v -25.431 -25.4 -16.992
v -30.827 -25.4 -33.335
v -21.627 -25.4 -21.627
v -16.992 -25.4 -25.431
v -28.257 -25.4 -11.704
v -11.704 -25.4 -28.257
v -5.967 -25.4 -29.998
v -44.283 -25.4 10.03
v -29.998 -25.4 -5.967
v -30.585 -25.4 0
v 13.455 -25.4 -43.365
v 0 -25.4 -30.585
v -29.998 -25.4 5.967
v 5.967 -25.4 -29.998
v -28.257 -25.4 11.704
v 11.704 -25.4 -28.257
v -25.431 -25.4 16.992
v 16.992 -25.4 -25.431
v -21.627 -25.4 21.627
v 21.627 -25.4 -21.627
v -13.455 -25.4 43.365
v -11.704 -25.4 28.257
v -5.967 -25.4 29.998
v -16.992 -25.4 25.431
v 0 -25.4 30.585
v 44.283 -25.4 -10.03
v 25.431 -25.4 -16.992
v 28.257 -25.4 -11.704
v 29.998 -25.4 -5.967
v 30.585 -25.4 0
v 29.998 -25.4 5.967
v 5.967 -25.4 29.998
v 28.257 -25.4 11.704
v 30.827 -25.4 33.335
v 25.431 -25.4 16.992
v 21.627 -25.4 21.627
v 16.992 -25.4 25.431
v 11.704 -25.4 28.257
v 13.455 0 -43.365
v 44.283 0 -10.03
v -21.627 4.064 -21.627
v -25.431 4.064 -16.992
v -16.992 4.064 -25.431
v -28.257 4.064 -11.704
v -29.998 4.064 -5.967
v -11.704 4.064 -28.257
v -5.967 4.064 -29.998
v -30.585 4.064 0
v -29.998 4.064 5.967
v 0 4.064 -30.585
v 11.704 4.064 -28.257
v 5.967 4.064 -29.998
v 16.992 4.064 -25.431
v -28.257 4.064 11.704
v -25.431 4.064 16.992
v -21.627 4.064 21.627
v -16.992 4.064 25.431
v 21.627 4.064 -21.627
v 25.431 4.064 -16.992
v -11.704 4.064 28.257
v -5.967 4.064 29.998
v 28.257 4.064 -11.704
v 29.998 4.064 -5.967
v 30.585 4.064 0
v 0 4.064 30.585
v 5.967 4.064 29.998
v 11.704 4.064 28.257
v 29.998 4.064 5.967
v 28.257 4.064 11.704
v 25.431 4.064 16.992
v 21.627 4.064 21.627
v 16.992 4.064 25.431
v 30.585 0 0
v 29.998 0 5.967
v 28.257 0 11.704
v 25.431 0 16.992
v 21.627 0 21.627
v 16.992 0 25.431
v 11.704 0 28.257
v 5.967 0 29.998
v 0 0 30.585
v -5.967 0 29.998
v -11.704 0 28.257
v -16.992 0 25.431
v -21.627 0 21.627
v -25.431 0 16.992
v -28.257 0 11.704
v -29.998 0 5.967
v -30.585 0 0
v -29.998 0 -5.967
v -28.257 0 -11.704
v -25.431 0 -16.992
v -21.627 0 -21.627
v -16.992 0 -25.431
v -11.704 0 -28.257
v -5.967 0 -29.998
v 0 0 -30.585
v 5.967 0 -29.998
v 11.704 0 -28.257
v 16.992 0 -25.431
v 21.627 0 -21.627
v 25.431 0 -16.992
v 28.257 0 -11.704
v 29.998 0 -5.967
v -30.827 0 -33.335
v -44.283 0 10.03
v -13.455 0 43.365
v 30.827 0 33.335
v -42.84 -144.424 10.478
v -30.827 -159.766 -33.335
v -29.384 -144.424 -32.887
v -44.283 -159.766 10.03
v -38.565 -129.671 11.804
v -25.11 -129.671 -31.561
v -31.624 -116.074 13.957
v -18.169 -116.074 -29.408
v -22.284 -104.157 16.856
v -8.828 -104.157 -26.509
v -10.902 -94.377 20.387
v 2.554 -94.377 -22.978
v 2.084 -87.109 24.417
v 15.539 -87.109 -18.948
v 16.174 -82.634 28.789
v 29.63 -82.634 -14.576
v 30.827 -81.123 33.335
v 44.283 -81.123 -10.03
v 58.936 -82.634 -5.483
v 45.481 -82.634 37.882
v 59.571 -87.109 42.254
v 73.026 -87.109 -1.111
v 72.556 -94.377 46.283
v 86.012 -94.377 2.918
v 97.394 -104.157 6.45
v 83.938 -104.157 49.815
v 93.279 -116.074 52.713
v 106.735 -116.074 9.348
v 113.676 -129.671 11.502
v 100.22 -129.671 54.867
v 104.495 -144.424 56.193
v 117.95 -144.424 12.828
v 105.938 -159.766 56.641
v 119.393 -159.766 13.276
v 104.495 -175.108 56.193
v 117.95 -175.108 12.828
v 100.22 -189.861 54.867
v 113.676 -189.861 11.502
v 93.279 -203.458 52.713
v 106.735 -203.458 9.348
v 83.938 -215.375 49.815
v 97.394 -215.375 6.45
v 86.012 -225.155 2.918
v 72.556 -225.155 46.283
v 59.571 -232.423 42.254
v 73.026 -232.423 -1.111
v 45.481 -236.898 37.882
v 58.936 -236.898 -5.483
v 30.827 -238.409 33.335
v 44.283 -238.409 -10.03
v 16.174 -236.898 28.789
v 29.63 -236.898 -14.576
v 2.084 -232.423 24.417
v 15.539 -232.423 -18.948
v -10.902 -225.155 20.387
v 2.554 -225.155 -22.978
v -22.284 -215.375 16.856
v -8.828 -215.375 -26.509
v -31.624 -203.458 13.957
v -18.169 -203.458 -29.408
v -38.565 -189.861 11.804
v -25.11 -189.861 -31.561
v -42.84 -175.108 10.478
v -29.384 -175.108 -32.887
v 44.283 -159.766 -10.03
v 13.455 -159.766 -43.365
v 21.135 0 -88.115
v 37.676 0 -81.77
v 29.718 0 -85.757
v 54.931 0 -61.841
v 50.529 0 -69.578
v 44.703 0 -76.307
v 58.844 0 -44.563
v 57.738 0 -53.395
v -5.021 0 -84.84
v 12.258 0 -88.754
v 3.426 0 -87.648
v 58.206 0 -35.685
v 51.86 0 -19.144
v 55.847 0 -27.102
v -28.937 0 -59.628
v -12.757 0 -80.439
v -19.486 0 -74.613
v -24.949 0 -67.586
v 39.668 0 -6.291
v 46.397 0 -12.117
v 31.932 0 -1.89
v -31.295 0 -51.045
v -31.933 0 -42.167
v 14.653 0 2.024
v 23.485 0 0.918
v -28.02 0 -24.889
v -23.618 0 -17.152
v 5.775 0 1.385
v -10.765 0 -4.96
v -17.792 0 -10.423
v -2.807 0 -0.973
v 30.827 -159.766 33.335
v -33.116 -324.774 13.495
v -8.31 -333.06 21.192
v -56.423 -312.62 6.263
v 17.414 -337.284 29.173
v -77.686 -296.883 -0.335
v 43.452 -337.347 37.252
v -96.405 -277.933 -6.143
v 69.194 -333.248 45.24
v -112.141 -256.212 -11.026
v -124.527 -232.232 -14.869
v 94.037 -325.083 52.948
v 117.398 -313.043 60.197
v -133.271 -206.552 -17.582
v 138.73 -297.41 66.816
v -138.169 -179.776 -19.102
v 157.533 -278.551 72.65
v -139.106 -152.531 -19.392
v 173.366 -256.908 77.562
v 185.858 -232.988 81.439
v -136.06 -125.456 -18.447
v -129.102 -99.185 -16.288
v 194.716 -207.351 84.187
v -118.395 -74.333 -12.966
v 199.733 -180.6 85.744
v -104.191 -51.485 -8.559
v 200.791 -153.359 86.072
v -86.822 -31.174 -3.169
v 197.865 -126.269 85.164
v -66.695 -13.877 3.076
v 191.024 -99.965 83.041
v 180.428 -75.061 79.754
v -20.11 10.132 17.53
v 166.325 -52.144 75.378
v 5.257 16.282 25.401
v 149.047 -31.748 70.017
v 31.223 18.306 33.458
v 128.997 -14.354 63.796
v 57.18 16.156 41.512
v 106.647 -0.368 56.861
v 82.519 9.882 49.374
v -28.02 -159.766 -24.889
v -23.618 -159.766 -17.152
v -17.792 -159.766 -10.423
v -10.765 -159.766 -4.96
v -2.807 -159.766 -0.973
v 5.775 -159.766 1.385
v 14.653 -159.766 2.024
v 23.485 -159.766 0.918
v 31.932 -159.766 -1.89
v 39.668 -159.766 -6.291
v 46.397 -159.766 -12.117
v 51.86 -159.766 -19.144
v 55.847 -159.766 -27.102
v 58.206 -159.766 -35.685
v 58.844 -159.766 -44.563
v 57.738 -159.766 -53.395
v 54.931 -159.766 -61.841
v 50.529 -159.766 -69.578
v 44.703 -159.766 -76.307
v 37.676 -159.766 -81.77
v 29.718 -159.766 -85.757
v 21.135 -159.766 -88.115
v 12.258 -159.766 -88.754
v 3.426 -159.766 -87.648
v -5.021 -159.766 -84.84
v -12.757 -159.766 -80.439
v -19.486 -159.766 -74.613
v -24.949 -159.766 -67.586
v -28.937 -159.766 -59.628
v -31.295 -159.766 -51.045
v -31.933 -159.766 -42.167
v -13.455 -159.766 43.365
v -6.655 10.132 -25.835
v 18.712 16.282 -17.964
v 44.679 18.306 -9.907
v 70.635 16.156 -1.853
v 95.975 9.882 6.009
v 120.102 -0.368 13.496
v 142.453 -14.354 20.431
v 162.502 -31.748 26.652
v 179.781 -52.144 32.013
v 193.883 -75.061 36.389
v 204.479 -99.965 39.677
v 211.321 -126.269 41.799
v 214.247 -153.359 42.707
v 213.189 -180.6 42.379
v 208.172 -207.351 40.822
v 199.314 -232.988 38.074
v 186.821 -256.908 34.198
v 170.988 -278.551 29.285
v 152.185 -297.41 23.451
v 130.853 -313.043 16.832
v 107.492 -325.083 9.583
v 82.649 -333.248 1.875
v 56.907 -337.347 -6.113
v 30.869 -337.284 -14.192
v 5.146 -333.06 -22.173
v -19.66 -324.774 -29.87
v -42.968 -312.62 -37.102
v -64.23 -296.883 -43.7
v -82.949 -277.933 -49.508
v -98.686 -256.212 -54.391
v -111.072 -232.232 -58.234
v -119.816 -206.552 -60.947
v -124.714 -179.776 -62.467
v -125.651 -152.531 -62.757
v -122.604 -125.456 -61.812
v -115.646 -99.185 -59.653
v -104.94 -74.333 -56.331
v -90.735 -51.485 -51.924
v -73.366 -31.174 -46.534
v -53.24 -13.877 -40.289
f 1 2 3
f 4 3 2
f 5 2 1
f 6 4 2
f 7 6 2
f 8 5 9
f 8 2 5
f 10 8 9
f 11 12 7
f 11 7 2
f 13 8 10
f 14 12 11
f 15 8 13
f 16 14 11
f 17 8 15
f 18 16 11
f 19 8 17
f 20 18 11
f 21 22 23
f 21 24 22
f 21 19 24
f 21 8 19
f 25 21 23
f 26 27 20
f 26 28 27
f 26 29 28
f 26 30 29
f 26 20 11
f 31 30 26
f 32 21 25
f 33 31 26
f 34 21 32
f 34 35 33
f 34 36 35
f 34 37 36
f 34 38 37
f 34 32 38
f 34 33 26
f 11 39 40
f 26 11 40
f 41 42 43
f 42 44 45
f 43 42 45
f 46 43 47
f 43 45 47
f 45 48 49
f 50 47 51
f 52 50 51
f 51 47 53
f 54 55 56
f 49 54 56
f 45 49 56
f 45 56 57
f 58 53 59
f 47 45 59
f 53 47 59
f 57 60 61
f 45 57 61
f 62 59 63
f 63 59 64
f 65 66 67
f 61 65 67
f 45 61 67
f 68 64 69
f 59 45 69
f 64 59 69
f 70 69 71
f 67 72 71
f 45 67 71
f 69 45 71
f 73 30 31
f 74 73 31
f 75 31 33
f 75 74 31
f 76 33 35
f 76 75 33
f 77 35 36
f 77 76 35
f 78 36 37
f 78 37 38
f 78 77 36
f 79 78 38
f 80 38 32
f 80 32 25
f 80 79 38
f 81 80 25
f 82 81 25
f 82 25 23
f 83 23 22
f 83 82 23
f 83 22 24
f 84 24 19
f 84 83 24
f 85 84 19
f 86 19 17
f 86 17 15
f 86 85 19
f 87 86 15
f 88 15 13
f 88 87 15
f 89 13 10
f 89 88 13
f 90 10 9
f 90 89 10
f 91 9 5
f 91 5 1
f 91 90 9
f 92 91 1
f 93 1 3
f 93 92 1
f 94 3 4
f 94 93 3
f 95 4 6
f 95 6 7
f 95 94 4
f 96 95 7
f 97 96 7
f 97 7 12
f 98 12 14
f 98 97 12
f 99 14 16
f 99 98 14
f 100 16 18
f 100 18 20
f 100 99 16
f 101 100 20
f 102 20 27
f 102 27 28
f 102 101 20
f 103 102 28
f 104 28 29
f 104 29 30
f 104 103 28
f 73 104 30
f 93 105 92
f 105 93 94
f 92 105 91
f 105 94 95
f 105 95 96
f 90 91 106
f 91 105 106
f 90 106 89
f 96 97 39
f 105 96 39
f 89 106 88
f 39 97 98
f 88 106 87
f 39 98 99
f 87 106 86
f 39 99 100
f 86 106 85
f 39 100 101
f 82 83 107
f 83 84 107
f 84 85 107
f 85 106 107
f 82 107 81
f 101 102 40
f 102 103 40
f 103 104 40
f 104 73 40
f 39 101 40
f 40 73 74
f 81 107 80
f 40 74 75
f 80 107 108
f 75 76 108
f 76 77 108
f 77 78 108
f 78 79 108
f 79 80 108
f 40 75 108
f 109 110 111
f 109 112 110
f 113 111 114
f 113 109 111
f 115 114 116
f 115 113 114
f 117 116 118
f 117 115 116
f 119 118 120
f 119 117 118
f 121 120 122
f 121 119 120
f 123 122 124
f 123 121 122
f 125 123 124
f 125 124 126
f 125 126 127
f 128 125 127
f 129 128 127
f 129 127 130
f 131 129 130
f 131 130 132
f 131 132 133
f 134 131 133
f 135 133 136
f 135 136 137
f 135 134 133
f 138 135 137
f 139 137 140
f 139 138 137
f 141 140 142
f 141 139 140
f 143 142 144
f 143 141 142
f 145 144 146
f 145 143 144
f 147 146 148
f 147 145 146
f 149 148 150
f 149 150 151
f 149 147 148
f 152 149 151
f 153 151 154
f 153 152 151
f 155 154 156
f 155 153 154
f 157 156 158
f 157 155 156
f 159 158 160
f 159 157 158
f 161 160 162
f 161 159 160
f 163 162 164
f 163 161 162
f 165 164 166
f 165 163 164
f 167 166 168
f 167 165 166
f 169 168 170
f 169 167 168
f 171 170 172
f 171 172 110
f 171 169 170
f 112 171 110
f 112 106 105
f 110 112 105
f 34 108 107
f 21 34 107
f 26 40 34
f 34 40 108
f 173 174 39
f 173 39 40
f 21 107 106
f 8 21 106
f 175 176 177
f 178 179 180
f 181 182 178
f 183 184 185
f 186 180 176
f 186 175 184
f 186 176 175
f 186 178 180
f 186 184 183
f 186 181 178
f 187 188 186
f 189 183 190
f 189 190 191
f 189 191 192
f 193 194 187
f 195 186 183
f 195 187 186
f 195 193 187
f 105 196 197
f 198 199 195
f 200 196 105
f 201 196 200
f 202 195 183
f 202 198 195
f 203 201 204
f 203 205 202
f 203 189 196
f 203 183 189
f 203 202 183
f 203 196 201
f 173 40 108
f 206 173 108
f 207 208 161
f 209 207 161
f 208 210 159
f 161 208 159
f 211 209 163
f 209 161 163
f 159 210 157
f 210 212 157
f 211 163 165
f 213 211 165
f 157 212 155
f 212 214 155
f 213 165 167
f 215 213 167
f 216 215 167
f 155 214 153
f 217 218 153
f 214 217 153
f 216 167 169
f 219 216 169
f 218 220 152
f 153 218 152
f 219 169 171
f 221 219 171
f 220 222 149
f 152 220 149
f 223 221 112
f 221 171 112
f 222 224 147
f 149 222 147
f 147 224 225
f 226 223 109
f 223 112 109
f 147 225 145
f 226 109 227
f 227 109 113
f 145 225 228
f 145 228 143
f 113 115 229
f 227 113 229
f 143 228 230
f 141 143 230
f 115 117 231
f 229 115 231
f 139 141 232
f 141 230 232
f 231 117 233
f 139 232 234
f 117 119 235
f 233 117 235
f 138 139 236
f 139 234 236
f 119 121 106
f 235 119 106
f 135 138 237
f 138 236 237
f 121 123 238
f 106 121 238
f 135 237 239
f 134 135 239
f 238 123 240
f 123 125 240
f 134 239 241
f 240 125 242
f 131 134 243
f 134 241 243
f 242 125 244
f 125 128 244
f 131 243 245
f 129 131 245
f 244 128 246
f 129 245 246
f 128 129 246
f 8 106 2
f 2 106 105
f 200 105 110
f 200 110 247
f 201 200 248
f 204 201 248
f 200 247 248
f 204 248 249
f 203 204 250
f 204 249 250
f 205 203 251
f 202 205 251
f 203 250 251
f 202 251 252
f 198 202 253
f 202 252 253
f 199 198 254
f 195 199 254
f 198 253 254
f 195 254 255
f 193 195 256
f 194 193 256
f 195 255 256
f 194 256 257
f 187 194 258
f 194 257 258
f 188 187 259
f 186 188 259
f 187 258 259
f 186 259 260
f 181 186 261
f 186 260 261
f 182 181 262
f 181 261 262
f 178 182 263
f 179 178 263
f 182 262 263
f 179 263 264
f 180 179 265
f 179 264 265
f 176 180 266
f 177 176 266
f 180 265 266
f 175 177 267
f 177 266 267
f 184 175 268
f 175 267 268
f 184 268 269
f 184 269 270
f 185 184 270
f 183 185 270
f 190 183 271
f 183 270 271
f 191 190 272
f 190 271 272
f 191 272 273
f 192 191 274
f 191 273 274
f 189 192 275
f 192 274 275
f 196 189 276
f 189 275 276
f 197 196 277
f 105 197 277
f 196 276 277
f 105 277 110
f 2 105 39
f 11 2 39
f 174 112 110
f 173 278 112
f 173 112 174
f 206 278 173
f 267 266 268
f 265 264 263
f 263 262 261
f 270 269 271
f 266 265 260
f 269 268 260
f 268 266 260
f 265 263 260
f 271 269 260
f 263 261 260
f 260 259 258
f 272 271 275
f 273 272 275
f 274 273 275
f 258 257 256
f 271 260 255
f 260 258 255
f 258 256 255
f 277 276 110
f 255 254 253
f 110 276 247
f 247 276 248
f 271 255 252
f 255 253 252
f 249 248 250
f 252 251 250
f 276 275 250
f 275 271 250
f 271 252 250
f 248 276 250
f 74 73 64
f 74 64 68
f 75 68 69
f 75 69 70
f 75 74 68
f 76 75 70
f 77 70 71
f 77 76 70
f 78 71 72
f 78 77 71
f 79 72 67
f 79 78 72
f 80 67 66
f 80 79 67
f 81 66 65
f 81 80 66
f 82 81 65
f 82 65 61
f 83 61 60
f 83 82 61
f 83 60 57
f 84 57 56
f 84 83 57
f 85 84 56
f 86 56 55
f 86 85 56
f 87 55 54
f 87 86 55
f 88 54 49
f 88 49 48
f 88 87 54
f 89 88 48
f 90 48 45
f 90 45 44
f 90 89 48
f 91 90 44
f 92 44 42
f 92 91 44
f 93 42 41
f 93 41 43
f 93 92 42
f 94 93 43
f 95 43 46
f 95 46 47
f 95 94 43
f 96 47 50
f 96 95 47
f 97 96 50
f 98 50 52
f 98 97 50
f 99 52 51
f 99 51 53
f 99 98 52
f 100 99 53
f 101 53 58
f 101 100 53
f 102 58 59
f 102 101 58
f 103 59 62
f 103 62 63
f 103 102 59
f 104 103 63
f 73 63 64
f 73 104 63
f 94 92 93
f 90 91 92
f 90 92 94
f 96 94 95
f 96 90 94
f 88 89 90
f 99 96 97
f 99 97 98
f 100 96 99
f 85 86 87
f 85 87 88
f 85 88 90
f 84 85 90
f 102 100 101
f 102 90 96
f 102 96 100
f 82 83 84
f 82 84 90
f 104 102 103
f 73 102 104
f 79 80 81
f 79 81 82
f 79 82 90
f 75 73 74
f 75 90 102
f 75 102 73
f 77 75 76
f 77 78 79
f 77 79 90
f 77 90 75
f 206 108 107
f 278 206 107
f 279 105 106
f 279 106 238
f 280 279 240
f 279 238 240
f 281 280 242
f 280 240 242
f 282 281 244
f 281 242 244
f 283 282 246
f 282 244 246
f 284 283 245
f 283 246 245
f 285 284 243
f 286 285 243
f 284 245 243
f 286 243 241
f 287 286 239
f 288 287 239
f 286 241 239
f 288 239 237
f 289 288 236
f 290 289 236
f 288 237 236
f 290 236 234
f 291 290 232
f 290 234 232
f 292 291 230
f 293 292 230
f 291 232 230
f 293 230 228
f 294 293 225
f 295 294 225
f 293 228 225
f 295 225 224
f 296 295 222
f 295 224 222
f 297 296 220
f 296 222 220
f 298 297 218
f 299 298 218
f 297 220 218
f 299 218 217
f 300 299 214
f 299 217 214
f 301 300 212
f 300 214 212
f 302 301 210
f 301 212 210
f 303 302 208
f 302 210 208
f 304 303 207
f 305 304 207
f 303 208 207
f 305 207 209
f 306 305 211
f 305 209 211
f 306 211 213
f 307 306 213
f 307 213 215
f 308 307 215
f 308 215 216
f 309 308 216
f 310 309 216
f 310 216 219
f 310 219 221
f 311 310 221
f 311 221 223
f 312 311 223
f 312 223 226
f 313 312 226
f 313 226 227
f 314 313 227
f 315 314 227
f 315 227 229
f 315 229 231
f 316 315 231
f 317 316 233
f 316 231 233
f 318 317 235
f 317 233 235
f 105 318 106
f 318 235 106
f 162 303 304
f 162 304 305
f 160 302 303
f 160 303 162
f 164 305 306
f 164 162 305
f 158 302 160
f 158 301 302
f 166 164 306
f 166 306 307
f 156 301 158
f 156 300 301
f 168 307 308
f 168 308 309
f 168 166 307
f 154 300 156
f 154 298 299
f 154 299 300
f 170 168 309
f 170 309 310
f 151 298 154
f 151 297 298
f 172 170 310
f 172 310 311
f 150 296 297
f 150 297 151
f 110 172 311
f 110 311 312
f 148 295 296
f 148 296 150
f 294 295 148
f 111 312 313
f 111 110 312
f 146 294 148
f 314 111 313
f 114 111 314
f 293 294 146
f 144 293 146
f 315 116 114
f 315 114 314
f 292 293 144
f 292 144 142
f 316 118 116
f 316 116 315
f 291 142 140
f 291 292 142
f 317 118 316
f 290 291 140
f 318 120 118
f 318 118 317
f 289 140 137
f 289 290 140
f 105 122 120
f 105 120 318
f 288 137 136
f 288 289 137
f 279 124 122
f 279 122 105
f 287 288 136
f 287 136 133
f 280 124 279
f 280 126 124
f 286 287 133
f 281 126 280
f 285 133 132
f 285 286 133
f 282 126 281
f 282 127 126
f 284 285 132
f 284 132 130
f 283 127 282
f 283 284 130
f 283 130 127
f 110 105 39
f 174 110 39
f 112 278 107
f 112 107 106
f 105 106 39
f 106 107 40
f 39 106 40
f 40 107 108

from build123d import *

# Parameters (mm, degrees)
F1_R       = 30.5852681074
F3_DEPTH   = 25.4
F2_R       = 30.5852681074
F4_DEPTH   = 4.064
F5_DEPTH   = 159.766
F5_FACE_W  = 45.4044749267
F5_FACE_H  = 159.766
F5_FACE1_W = 159.766
F5_FACE1_H = 45.4044749267


with BuildPart() as f3:
    # F1 (on face) → F3 (new body)
    with BuildSketch(Plane.XZ):
        Polygon((-13.4554065448, 43.3649441148), (-44.2828465095, 10.0297481713), (-30.8274399647, -33.3351959435), (13.4554065448, -43.3649441148), (44.2828465095, -10.0297481713), (30.8274399647, 33.3351959435), align=None)
        Circle(F1_R, mode=Mode.SUBTRACT)
    extrude(amount=F3_DEPTH)


with BuildPart() as f4:
    # F2 (on face) → F4 (new body)
    with BuildSketch(Plane.XZ):
        Circle(F2_R)
    extrude(amount=-F4_DEPTH)


with BuildPart() as f5:
    # F0 (on Front) → F5 (new body)
    with BuildSketch(Plane.XZ):
        Polygon((-44.2828465095, 10.0297481713), (-30.8274399647, -33.3351959435), (13.4554065448, -43.3649441148), (44.2828465095, -10.0297481713), (30.8274399647, 33.3351959435), (-13.4554065448, 43.3649441148), align=None)
    extrude(amount=F5_DEPTH)


with BuildPart() as f6:
    # F5_face (on face) → F6 (revolve)
    with BuildSketch(Plane(origin=(-8.6860167099, -79.883, -38.3500700291), x_dir=(1, 0, 0), z_dir=(-0.2208977901, 0, -0.9752969632))):
        Rectangle(F5_FACE_W, F5_FACE_H)
    revolve(axis=Axis((13.4554065448, -79.883, -43.3649441148), (0, 1, 0)))


with BuildPart() as f7:
    # F5_face1 (on face) → F7 (revolve)
    with BuildSketch(Plane(origin=(-37.5551432371, -79.883, -11.6527238861), x_dir=(0, -1, 0), z_dir=(-0.9550808414, 0, -0.2963453837))):
        Rectangle(F5_FACE1_W, F5_FACE1_H)
    revolve(axis=Axis((37.5551432371, -159.766, 11.6527238861), (0.2963453837, 0, -0.9550808414)))


solid = Compound([f3.part, f4.part, f5.part, f6.part, f7.part])
